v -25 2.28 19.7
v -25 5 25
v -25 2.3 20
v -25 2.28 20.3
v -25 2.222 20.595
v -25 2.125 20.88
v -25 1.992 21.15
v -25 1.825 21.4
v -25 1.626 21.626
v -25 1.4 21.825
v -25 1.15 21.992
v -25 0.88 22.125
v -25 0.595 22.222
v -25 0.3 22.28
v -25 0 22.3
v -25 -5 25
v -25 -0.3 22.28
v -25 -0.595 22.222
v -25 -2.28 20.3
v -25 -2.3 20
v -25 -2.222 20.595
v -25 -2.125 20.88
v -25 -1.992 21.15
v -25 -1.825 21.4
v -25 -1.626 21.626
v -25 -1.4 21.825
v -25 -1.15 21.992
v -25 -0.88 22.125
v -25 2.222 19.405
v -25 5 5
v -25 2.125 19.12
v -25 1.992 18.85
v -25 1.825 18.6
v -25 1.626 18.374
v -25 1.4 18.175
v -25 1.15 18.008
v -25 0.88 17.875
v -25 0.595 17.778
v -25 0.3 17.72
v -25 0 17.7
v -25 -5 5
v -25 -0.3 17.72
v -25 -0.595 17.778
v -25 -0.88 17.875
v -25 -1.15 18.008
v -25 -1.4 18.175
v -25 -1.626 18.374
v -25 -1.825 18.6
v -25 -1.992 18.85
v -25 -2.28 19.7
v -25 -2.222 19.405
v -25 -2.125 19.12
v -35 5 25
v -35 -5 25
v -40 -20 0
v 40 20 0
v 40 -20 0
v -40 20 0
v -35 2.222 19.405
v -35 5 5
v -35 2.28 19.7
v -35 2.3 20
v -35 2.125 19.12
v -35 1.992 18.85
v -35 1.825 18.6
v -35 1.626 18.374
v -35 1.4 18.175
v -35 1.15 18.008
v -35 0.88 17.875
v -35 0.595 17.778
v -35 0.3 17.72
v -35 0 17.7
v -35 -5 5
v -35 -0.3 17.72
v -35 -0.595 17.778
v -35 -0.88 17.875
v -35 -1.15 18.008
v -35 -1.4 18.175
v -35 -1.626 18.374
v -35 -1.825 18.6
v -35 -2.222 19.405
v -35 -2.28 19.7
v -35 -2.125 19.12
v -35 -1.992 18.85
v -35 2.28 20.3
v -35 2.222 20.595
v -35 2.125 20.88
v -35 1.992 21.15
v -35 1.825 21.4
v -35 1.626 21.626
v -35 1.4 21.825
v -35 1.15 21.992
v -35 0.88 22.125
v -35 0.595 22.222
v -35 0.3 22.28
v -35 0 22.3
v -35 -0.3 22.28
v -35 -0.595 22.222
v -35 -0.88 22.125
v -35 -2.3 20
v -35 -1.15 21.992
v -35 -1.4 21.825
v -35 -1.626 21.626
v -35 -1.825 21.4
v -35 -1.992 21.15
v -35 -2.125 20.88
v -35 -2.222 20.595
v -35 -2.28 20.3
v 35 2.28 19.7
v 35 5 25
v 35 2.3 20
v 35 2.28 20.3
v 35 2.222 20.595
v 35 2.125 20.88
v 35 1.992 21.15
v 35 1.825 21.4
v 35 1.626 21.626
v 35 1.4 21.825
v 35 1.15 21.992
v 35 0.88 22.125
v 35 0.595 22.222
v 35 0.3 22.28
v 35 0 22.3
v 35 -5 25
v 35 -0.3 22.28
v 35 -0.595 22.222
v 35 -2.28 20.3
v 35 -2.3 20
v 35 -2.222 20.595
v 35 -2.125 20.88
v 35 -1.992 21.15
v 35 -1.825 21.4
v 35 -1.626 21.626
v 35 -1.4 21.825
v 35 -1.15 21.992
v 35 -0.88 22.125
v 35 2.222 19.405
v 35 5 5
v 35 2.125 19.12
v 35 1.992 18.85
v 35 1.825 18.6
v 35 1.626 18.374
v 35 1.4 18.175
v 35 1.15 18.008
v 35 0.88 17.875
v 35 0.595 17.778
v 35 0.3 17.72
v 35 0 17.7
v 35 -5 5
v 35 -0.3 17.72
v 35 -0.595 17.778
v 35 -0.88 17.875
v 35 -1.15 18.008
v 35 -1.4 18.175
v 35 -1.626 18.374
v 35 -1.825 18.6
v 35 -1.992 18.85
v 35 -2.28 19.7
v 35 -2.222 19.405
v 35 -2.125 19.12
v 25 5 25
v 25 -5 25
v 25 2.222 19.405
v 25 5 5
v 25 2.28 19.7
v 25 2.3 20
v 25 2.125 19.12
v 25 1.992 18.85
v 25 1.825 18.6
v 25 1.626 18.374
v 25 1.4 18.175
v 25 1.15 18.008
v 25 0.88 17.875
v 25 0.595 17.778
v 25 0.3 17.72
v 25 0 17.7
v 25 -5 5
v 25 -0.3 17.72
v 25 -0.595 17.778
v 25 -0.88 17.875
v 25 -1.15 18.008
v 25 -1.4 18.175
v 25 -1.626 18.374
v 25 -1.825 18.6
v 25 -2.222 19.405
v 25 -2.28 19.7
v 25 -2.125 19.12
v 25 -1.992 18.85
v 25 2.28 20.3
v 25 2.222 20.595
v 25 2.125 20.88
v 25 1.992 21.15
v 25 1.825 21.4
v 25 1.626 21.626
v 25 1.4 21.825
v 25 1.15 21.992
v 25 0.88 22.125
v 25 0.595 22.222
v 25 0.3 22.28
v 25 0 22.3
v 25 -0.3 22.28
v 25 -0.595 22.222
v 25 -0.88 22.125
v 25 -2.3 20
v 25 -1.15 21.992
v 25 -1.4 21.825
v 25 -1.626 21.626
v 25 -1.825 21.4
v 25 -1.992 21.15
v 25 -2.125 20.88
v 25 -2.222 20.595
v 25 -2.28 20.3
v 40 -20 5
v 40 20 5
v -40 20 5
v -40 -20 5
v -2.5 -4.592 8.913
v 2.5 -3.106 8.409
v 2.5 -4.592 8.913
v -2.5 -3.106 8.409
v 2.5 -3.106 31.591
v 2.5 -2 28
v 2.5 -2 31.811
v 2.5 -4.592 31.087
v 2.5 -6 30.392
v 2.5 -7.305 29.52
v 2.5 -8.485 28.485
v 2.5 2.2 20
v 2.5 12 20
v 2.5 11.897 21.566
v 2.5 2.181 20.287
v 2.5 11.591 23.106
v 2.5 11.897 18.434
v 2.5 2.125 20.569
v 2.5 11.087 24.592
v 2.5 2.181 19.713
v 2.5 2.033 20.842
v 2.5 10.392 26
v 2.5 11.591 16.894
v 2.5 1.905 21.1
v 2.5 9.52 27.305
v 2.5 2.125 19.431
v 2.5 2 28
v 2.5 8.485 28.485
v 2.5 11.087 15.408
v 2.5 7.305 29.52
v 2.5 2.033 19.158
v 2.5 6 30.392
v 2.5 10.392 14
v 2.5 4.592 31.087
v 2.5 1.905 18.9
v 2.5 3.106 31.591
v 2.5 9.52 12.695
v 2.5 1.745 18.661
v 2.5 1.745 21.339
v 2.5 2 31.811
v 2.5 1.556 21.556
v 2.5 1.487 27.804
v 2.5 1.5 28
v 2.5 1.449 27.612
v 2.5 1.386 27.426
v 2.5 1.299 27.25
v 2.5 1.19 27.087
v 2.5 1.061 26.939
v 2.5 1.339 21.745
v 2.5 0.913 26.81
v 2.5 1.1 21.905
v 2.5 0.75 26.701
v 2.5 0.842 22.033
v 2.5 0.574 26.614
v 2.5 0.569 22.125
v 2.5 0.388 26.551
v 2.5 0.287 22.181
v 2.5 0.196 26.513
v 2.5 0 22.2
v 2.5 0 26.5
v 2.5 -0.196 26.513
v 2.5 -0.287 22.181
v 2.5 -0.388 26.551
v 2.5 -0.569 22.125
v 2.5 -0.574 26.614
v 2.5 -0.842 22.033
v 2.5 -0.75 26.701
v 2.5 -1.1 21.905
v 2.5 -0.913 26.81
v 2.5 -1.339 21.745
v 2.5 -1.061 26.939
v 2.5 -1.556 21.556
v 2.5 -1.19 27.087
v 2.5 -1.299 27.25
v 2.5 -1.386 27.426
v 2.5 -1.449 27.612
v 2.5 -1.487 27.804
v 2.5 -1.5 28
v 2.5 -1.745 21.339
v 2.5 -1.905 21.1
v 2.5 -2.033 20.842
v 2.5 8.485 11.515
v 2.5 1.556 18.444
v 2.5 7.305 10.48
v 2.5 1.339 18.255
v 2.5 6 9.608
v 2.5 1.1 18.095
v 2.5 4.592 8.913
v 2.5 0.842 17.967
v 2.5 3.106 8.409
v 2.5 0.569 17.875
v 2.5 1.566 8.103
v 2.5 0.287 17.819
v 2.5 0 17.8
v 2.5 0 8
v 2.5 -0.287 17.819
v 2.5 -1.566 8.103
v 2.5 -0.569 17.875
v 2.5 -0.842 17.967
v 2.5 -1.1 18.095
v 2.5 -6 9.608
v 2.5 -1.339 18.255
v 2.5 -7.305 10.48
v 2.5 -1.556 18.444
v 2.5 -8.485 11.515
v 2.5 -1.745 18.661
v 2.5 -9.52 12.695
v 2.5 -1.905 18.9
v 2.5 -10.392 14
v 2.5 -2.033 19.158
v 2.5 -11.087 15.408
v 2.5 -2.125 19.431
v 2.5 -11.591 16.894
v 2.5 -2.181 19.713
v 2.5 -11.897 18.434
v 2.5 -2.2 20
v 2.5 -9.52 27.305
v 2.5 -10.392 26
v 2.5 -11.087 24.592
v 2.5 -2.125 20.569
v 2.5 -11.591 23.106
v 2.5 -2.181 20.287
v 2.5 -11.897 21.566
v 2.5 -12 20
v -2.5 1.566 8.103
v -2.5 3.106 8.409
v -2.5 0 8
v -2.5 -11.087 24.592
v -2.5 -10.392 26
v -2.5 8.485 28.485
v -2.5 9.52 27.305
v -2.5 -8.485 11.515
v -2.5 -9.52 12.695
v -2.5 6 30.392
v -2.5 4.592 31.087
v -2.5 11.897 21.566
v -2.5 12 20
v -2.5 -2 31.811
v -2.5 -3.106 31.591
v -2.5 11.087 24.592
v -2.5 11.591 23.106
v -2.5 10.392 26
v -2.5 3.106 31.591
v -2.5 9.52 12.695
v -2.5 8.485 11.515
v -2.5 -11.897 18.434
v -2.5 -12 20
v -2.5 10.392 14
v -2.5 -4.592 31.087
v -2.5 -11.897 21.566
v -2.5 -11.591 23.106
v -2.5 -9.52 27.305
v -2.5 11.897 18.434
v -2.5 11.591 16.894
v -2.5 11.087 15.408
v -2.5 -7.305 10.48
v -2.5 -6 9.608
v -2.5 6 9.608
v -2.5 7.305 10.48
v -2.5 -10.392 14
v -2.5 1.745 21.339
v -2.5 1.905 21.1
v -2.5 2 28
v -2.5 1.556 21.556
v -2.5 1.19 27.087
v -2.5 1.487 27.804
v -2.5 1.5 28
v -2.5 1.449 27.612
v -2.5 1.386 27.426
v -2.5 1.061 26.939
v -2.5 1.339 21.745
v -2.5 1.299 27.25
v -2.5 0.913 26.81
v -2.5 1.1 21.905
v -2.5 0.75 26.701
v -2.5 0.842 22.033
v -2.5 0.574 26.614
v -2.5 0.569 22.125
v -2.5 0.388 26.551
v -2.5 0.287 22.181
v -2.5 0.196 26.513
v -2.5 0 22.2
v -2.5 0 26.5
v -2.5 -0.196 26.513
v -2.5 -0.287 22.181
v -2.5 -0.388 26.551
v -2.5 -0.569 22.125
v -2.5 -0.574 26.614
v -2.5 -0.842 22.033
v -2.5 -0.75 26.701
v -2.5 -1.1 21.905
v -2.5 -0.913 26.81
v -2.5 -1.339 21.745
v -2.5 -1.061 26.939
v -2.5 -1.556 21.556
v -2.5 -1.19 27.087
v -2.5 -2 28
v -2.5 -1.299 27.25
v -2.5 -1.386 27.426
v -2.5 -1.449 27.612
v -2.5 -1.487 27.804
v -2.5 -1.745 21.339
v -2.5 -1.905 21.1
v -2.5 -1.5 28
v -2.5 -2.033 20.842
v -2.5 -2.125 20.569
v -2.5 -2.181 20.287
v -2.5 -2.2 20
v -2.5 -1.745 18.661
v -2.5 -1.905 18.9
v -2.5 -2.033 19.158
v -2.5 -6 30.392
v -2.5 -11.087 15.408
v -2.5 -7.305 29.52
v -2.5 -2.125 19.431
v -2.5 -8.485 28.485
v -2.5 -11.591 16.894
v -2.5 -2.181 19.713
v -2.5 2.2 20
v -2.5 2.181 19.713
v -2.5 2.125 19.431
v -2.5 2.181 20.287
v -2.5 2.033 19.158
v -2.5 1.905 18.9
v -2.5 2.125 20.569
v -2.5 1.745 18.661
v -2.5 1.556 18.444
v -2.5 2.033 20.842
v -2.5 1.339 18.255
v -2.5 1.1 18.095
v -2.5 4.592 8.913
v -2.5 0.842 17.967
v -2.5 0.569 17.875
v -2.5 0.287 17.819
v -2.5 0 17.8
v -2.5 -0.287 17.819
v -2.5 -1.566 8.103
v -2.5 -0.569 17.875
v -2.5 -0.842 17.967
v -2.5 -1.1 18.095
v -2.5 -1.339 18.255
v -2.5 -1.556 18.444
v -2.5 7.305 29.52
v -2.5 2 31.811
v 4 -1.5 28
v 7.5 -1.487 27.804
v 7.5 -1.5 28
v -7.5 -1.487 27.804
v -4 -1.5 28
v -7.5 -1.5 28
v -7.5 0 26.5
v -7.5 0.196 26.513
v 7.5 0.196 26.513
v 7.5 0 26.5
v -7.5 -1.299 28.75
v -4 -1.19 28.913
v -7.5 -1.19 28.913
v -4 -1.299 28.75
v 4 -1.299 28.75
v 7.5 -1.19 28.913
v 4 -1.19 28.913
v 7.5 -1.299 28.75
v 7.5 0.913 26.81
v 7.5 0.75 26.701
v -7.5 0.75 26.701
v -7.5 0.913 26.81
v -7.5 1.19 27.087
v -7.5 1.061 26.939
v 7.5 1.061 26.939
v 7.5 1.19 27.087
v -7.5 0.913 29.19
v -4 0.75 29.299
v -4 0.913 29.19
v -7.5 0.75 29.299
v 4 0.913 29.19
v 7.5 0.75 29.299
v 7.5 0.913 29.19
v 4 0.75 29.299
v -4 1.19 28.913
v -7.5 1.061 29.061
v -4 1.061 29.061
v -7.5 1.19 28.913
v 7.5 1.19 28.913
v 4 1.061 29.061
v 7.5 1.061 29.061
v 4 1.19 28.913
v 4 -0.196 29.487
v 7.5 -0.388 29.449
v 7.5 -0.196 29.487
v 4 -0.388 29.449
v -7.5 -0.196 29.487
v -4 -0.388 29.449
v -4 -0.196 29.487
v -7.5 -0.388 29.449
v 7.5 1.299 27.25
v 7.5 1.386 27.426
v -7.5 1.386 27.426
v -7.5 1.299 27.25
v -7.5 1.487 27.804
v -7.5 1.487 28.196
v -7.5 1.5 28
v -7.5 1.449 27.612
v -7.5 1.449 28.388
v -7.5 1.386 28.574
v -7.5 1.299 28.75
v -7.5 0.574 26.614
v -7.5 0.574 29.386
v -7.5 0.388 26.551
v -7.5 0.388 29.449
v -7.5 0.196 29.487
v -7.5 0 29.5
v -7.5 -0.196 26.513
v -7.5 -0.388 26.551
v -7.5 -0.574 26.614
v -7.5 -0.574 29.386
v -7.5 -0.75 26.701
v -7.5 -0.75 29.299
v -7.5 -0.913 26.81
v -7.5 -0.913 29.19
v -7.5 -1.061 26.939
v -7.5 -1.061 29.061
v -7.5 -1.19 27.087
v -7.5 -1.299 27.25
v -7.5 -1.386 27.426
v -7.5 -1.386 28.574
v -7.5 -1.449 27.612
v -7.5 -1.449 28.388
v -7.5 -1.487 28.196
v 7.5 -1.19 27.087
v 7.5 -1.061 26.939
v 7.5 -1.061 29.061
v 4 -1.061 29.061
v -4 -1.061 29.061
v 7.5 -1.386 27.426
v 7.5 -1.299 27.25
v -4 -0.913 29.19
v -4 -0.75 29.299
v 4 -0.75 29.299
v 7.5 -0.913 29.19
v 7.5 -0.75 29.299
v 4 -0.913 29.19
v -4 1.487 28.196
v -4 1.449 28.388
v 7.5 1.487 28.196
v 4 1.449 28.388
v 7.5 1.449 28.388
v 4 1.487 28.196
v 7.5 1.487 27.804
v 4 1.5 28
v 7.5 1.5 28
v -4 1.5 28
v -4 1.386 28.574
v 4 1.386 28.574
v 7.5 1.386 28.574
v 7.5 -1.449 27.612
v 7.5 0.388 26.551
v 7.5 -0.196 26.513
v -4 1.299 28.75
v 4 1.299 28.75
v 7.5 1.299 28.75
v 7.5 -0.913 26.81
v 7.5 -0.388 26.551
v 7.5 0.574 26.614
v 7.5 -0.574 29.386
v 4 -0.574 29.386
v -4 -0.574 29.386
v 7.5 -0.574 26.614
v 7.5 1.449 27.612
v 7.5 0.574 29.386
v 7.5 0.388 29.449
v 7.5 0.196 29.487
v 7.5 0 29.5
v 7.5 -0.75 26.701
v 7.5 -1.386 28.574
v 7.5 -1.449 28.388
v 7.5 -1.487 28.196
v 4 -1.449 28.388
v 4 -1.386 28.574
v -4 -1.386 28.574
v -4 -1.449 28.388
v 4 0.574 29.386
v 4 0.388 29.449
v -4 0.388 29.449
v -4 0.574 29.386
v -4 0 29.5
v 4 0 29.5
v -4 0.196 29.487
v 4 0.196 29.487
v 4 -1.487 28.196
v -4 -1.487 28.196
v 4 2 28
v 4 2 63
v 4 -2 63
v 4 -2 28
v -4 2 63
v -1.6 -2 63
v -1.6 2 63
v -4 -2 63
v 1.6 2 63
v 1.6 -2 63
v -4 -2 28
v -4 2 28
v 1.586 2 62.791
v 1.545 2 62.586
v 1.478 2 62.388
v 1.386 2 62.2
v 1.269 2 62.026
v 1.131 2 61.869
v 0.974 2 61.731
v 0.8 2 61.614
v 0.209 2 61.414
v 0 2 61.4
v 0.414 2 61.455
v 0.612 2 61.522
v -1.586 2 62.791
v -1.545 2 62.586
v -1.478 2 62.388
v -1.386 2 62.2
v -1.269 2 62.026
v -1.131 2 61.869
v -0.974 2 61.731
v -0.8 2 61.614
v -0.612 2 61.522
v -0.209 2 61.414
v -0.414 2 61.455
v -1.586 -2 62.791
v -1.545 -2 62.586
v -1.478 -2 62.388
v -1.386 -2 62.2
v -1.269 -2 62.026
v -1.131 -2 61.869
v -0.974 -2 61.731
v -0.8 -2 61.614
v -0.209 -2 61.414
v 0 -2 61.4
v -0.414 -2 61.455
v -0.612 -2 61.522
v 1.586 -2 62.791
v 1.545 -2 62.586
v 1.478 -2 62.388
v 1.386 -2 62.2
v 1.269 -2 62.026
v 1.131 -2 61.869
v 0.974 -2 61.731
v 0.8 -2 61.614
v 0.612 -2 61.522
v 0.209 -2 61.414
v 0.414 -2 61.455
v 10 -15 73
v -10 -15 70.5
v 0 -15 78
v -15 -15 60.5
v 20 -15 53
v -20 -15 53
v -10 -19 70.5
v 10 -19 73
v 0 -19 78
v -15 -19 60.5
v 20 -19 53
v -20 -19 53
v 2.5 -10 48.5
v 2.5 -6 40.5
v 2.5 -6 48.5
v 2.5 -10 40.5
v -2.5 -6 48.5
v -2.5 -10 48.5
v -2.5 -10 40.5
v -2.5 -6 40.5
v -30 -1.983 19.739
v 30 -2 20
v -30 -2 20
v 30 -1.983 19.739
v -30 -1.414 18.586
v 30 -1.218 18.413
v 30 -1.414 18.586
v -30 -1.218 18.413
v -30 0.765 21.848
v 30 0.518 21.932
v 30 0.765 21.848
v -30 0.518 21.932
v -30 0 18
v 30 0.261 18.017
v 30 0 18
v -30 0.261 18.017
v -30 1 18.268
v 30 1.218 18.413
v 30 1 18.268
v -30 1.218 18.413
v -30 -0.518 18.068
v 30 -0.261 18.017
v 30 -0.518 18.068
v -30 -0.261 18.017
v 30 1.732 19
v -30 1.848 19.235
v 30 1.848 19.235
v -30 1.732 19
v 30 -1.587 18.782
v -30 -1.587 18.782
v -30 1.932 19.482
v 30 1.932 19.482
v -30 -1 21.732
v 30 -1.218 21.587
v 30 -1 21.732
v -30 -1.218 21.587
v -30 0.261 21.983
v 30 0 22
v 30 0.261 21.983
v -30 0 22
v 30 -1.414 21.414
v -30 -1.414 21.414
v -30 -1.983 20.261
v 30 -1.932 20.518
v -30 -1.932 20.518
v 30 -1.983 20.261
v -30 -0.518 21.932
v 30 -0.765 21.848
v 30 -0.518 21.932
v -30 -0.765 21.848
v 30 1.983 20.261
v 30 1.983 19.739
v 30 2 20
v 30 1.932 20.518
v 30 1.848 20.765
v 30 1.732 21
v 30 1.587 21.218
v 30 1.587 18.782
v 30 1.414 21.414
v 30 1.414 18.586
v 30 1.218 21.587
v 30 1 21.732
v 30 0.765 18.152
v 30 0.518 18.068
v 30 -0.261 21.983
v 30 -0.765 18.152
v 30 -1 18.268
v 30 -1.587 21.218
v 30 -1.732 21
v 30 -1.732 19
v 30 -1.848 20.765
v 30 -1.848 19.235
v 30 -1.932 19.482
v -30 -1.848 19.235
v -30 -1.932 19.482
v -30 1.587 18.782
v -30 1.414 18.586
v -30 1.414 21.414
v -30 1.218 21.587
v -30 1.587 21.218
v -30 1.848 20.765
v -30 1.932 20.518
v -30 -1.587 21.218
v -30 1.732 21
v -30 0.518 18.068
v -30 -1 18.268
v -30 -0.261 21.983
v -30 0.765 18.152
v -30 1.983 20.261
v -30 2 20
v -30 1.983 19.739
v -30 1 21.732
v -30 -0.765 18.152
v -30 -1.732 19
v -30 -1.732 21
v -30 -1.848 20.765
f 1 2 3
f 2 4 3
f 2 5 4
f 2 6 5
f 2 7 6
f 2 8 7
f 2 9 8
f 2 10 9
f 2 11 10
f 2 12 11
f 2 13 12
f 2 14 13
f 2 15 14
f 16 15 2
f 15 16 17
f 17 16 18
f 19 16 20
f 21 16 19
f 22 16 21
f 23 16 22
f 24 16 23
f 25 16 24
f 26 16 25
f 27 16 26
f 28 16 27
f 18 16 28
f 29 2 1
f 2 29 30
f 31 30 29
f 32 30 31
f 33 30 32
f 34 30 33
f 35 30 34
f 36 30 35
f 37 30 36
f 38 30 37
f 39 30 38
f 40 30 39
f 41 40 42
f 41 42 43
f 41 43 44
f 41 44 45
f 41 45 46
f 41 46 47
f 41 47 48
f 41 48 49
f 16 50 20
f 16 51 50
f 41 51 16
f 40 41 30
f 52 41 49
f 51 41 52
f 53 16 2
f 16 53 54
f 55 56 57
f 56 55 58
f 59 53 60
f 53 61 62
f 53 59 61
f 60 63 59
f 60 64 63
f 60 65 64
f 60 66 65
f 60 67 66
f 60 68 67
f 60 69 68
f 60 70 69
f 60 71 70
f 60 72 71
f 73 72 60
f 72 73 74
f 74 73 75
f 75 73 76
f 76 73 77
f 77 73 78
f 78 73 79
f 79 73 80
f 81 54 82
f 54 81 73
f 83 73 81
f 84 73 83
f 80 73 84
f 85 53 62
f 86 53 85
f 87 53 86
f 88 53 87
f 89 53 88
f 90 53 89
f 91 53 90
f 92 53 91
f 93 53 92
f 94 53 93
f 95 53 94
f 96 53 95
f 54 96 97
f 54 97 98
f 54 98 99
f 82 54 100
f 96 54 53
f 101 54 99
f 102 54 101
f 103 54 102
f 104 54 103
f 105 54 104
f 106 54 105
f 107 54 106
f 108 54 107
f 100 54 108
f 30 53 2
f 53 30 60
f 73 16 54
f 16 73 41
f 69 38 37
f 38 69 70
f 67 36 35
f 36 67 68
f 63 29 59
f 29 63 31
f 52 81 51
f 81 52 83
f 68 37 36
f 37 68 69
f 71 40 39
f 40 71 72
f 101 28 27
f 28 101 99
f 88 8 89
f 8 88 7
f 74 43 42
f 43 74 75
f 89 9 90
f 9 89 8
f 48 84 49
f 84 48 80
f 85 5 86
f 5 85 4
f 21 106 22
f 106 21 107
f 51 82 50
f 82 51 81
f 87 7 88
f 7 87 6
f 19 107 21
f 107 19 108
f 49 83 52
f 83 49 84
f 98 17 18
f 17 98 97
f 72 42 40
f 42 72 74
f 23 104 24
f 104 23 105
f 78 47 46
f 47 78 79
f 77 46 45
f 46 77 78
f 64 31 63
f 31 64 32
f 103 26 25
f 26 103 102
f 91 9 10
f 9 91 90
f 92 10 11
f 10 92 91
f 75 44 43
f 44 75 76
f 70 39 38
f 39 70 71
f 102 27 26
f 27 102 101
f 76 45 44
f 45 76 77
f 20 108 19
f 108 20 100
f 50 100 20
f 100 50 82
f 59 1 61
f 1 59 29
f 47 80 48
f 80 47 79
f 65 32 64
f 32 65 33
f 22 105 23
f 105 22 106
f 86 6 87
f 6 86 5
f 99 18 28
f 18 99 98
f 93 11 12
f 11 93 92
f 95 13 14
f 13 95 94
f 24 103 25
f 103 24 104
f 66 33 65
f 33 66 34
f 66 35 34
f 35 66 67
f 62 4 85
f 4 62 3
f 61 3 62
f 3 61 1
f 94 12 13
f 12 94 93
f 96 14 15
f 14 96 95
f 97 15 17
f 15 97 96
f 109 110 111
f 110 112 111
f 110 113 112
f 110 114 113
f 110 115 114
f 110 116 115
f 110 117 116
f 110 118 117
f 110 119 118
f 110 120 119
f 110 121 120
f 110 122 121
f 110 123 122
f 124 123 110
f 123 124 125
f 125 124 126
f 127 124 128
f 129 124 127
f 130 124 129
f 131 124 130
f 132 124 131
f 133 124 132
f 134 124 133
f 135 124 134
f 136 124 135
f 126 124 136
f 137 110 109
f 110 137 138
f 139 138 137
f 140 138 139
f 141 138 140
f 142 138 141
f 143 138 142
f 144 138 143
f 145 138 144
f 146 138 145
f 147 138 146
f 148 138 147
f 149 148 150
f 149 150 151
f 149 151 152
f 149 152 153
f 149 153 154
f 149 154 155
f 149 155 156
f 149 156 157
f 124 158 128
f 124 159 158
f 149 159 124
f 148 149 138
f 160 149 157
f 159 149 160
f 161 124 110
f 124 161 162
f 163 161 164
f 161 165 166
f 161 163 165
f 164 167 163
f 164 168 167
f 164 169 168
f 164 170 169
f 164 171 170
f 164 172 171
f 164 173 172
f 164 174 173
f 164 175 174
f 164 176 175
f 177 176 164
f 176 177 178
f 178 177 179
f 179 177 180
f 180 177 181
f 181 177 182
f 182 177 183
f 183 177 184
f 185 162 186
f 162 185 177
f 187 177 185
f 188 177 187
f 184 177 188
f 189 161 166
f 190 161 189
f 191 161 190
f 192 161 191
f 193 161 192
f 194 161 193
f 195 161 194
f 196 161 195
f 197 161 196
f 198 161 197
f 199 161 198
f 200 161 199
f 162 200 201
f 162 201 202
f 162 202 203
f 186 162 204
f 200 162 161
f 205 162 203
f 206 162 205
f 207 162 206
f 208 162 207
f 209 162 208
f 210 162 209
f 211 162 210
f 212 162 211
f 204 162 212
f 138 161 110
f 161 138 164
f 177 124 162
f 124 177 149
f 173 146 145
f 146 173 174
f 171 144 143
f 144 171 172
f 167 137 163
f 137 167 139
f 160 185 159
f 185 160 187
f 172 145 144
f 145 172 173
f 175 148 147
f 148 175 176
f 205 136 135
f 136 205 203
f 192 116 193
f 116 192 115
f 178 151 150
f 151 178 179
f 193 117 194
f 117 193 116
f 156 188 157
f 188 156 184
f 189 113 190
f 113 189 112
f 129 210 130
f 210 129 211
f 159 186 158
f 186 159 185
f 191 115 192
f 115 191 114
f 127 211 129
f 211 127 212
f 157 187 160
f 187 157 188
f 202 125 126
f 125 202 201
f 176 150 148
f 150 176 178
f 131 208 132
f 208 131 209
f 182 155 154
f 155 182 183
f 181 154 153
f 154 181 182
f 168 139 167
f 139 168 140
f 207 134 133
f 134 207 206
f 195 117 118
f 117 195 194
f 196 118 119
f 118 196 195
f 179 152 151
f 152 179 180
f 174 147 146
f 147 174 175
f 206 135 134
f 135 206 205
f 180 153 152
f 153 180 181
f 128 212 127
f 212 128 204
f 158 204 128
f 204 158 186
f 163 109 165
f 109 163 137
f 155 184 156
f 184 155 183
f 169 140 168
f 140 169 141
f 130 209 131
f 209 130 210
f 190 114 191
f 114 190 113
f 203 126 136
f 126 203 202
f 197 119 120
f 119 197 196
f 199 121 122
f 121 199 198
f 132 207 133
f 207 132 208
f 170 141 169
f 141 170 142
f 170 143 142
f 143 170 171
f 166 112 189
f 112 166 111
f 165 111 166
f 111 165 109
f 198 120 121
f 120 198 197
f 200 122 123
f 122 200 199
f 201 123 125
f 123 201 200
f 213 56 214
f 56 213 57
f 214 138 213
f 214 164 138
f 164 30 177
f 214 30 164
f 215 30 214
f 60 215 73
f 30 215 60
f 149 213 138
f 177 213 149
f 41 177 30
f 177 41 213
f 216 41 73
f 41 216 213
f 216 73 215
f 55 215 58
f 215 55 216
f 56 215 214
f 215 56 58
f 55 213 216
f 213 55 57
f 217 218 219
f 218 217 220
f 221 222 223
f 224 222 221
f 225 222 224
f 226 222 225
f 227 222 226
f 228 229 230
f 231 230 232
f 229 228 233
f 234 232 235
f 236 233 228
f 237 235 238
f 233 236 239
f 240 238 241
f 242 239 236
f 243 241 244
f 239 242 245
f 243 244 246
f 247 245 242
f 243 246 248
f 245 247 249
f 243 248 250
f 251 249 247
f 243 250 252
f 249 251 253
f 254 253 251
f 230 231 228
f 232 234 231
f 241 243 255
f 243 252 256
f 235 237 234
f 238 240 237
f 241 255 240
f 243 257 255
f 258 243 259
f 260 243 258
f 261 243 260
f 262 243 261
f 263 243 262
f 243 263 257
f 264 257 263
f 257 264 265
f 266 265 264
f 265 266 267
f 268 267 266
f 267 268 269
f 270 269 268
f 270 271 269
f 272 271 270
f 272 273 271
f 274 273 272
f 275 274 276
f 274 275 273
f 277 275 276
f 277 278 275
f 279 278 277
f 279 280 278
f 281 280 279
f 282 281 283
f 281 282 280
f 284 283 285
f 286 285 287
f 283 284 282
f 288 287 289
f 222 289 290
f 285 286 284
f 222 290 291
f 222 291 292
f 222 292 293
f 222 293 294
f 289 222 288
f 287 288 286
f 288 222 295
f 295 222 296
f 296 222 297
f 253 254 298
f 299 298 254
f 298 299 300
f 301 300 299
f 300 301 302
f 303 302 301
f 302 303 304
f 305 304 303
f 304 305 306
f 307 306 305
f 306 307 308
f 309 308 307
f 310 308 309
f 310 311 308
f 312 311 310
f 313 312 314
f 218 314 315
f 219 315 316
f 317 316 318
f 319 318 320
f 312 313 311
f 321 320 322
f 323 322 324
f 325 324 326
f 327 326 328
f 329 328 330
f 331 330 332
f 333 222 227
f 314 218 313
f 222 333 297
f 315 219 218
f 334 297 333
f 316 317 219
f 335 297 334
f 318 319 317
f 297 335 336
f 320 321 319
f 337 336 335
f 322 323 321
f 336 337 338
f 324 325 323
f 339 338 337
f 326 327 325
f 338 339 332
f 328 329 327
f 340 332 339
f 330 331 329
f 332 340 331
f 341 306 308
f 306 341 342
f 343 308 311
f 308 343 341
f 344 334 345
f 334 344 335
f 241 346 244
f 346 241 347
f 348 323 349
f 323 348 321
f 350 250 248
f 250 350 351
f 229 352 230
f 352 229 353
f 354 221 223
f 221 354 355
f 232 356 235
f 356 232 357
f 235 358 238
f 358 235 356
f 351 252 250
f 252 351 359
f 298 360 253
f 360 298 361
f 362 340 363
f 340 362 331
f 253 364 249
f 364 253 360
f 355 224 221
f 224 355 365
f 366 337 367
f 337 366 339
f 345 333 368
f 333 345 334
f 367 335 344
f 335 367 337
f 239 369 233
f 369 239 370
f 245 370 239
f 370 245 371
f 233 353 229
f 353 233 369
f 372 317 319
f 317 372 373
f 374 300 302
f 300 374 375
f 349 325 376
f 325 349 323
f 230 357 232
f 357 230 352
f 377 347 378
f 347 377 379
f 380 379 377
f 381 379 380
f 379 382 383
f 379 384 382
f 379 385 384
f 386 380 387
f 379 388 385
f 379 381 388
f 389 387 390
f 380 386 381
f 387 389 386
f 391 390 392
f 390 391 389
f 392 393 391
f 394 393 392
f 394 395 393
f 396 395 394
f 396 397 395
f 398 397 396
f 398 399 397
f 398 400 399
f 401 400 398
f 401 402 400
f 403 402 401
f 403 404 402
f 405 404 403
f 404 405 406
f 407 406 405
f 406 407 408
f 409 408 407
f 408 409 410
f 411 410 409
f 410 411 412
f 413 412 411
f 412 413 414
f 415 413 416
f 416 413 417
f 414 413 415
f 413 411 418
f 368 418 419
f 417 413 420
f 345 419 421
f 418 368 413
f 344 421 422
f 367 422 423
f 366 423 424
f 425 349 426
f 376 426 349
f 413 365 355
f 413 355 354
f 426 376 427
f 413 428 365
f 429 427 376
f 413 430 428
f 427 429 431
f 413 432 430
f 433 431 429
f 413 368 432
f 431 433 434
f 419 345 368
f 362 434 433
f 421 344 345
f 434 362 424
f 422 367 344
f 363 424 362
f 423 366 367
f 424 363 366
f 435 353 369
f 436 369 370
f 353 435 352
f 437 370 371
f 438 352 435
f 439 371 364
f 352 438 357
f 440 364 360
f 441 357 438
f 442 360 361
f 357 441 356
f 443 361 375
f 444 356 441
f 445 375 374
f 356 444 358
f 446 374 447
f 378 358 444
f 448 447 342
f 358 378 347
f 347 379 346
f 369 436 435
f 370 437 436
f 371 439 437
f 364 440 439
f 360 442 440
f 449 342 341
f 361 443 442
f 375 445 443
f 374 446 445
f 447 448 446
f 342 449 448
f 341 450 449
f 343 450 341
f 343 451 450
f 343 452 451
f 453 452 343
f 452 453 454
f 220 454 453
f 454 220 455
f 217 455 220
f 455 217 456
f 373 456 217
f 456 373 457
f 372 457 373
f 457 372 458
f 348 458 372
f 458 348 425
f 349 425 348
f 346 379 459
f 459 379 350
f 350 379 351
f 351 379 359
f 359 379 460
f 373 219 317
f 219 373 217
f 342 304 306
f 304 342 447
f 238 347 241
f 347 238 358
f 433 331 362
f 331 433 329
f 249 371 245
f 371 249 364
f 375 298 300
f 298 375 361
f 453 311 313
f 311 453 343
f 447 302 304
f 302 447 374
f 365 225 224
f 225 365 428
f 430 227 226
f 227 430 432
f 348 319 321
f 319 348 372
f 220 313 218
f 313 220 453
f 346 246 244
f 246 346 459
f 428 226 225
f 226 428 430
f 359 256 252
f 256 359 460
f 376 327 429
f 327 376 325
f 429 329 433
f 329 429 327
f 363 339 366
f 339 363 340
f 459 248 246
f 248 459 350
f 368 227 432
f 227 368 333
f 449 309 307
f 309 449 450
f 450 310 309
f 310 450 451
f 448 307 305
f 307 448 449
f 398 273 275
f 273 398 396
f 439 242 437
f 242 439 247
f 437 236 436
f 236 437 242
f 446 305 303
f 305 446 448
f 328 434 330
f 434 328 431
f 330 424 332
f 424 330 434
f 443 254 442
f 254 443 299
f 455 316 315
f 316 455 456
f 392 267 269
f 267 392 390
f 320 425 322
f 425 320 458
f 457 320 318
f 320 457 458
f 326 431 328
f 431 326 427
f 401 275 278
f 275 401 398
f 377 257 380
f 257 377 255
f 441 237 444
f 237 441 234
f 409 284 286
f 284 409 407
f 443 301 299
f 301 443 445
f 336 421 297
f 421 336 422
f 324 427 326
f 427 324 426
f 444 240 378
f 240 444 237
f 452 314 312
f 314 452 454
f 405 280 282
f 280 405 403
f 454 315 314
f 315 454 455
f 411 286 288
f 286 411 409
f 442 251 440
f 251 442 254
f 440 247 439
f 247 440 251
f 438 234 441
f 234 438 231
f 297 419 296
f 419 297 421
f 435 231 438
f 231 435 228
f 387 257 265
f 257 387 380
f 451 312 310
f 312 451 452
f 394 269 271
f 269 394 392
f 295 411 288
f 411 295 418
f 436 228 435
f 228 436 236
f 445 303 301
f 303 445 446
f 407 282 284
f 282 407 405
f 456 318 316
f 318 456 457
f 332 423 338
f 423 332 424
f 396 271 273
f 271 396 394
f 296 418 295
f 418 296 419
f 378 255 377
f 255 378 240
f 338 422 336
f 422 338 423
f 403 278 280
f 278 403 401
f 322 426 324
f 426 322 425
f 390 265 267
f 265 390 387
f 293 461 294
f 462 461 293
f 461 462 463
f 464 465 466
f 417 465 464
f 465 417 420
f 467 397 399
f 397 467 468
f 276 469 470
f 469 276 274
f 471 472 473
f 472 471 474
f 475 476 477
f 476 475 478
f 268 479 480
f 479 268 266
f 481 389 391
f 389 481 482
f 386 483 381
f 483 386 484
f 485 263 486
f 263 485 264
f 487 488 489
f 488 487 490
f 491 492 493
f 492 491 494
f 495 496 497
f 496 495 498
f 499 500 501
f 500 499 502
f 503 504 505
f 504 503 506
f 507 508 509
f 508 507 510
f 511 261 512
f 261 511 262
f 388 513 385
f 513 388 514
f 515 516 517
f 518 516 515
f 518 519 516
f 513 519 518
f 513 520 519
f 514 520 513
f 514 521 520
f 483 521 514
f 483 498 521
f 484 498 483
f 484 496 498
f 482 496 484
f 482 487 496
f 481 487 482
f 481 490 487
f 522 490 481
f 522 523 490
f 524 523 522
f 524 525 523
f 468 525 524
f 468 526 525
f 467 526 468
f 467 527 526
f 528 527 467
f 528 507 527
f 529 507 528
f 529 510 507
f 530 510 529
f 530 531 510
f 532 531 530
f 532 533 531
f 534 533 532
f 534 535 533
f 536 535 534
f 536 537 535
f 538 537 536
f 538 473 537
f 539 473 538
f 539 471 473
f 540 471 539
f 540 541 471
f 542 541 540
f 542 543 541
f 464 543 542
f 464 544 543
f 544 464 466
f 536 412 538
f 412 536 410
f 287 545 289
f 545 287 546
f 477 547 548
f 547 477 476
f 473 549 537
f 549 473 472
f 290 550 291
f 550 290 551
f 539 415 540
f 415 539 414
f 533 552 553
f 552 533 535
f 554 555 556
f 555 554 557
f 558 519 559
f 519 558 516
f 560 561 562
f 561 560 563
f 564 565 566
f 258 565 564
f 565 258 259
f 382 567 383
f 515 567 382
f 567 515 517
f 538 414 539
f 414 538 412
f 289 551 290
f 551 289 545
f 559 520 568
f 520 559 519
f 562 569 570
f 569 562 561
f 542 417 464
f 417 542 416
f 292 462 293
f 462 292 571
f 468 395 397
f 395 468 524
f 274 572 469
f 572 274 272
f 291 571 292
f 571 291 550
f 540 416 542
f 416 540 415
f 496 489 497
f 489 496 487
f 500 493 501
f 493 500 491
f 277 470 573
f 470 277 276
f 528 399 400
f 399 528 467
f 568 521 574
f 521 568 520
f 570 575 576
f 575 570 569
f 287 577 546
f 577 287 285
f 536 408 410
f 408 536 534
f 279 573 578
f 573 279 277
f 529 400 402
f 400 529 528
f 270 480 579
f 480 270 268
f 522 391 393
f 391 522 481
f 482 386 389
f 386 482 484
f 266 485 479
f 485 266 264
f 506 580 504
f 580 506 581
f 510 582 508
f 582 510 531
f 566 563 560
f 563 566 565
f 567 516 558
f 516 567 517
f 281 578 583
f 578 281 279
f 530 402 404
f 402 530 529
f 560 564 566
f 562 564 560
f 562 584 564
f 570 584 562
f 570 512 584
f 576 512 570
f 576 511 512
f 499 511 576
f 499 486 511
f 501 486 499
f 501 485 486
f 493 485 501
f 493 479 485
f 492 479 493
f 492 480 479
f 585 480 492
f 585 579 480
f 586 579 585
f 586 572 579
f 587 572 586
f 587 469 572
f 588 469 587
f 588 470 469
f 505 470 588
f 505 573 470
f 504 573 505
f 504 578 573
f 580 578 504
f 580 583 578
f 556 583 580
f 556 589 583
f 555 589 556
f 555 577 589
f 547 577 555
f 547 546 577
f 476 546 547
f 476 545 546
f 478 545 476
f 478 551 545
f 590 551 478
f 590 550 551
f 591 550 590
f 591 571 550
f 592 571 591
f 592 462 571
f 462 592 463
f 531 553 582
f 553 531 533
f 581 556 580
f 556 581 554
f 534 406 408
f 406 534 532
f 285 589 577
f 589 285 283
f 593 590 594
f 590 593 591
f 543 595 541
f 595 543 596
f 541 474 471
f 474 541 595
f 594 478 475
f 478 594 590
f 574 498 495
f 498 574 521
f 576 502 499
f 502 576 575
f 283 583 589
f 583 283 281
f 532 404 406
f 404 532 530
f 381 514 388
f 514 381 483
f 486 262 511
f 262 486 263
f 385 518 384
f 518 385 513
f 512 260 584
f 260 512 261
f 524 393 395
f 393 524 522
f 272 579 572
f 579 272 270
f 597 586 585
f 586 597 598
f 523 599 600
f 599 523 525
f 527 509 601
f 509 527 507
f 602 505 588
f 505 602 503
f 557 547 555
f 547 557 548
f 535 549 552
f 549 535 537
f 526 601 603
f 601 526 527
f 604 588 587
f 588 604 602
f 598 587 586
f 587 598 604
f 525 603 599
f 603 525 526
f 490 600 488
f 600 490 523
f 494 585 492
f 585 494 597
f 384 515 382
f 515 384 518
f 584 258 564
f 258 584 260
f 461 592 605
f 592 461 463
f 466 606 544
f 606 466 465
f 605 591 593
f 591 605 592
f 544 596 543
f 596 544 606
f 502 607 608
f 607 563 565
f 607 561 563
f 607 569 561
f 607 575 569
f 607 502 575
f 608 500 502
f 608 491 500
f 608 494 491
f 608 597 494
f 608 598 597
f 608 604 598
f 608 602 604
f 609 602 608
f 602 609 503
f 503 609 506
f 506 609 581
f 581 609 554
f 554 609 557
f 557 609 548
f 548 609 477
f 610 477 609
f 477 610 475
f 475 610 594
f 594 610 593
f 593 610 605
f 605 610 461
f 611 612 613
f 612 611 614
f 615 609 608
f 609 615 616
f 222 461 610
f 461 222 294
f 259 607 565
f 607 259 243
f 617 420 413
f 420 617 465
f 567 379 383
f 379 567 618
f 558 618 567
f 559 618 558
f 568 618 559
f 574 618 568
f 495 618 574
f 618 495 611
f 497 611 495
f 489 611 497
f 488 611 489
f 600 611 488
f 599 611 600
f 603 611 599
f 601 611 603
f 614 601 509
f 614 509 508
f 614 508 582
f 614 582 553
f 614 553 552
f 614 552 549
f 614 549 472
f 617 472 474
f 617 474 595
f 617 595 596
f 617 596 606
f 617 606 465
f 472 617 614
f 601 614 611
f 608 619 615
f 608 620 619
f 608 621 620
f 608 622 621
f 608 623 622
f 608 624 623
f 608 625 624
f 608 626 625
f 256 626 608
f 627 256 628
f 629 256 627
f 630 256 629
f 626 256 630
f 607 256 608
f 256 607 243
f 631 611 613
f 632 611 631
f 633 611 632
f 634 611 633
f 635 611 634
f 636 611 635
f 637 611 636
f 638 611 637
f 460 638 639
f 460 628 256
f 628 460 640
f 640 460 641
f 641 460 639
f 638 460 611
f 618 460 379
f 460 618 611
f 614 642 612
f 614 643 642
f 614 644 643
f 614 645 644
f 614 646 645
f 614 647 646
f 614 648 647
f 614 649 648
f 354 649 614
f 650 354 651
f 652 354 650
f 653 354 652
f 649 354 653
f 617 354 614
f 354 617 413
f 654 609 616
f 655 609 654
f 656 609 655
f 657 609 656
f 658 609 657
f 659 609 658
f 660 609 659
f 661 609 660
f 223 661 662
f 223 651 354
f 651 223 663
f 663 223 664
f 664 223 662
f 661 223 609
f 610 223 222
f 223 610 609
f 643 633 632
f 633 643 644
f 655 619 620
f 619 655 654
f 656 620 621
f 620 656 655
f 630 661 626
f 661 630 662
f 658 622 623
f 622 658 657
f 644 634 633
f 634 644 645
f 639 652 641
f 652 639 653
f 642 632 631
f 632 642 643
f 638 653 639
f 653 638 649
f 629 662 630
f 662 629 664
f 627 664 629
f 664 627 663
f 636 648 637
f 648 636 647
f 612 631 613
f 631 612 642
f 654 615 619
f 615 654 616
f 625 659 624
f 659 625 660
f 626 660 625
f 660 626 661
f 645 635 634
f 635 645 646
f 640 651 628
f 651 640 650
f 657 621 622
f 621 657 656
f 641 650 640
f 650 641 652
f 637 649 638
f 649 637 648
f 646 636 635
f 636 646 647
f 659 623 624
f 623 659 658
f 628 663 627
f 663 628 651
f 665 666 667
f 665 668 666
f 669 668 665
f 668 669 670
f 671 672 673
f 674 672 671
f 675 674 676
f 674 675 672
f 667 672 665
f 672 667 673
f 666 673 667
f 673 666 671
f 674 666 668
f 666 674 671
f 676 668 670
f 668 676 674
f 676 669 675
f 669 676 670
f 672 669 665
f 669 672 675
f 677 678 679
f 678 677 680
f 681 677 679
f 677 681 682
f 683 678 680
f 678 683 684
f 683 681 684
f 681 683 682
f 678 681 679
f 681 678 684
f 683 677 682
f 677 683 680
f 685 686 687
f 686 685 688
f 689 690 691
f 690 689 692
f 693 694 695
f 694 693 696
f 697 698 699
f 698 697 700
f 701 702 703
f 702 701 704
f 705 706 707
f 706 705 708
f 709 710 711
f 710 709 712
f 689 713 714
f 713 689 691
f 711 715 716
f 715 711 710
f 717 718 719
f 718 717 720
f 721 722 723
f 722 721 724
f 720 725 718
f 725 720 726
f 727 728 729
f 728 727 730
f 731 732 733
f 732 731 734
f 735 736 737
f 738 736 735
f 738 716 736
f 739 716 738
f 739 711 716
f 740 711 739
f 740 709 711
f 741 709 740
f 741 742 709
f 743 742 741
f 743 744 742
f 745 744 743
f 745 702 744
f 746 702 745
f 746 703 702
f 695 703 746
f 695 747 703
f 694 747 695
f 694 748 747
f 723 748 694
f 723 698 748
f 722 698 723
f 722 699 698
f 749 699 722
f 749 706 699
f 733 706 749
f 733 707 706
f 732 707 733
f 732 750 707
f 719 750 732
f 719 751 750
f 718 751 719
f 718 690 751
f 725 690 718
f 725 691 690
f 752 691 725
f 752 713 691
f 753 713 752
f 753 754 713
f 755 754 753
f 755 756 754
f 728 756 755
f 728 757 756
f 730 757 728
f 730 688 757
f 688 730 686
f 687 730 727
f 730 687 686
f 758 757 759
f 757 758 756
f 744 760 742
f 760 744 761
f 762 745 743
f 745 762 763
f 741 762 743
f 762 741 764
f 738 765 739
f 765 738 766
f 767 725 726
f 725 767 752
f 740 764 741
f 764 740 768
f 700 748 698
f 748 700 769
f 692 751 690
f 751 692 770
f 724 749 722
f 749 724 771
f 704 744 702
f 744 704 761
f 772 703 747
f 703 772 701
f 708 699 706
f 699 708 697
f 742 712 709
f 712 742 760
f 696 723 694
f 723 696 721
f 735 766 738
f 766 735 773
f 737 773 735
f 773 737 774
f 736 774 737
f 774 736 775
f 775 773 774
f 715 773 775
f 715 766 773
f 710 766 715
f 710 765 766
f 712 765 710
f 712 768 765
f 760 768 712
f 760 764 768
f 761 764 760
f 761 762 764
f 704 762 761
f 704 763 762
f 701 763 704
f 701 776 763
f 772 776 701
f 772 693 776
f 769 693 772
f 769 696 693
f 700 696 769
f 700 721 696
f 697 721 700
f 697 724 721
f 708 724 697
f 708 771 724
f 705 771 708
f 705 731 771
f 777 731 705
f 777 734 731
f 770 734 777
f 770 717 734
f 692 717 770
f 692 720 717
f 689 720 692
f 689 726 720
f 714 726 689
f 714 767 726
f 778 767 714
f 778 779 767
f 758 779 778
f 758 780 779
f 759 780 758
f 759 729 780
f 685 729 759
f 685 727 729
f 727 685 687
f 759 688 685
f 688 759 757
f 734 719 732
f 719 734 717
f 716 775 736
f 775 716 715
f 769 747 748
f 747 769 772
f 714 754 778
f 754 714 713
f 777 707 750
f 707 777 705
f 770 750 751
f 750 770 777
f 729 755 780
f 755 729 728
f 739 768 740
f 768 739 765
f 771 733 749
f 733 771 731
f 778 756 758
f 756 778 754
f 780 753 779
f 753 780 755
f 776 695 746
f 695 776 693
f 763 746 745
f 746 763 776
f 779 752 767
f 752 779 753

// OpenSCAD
/*
 * WAVE OCEAN V10 - APPROACH A: ECCENTRIC CRANK
 * Single wave test - validates mechanism geometry
 *
 * VIEWER POV: Front view, looking at -Y axis
 *   X = horizontal (left/right)
 *   Z = vertical (up/down)
 *   Y = depth (into screen)
 *
 * MECHANISM: Eccentric crank drives wave in elliptical path
 *   - Rotating disc with offset pin
 *   - Crank arm connects pin to wave element
 *   - Guide rails constrain wave to vertical + slight horizontal
 *
 * Expected motion: Wave rises while drifting RIGHT, falls while drifting LEFT
 */

$fn = 48;

// ============================================
// ANIMATION
// ============================================

MANUAL_ANGLE = -1;  // Set 0-360 for static, -1 for animation
theta = (MANUAL_ANGLE >= 0) ? MANUAL_ANGLE : $t * 360;

// ============================================
// PHYSICAL DIMENSIONS (mm)
// ============================================

// Drive shaft (horizontal, runs along X axis)
SHAFT_DIA = 4;
SHAFT_LENGTH = 60;
SHAFT_Y = 0;        // Center of mechanism (depth)
SHAFT_Z = 20;       // Height of shaft axis

// Eccentric disc (mounted on shaft)
DISC_OUTER_DIA = 24;
DISC_THICKNESS = 5;
ECCENTRIC_RADIUS = 8;  // Distance from shaft center to pin center
                       // This sets amplitude: wave moves +/- 8mm vertically

// Crank pin (on disc, offset from center)
PIN_DIA = 3;
PIN_LENGTH = 15;       // Must be long enough to reach crank arm

// Crank arm (connects pin to wave)
CRANK_LENGTH = 35;     // Distance from pin axis to wave pivot
CRANK_WIDTH = 8;
CRANK_THICKNESS = 4;
CRANK_HOLE_DIA = 3.2;  // Clearance for pin

// Wave element (the visible moving part)
WAVE_WIDTH = 40;       // X dimension (visible width)
WAVE_HEIGHT = 25;      // Z dimension (visible height)
WAVE_DEPTH = 4;        // Y dimension (thickness)

// Guide rail (constrains wave motion)
GUIDE_HEIGHT = 60;     // Total height of guide
GUIDE_SLOT_WIDTH = 6;  // Horizontal slot allows slight X drift
GUIDE_SLOT_HEIGHT = 40;// Vertical travel range
GUIDE_THICKNESS = 5;

// Wave pivot tab (rides in guide slot)
TAB_WIDTH = 5;
TAB_HEIGHT = 8;
TAB_DEPTH = WAVE_DEPTH;

// Frame reference
FRAME_WIDTH = 80;
FRAME_DEPTH = 40;
FRAME_HEIGHT = 5;

// ============================================
// COLORS
// ============================================

C_SHAFT = [0.6, 0.6, 0.65];
C_DISC = [0.8, 0.5, 0.2];      // Bronze
C_PIN = [0.5, 0.5, 0.55];
C_CRANK = [0.7, 0.7, 0.75];
C_WAVE = [0.25, 0.45, 0.75];   // Ocean blue
C_GUIDE = [0.35, 0.35, 0.4];
C_FRAME = [0.3, 0.3, 0.35];

// ============================================
// KINEMATICS
// ============================================

// Pin position (traces circle as disc rotates)
function pin_x() = 0;  // Pin stays at disc X position
function pin_y() = SHAFT_Y + ECCENTRIC_RADIUS * sin(theta);
function pin_z() = SHAFT_Z + ECCENTRIC_RADIUS * cos(theta);

// Wave center position (connected to pin via crank arm)
// Crank arm is rigid, length CRANK_LENGTH
// Wave is constrained to move mostly vertically by guide rail
// Simplified: wave Z follows pin Z, wave X drifts based on pin Y
function wave_z() = pin_z() + (CRANK_LENGTH - 10);  // Offset above pin
function wave_x_drift() = pin_y() * 0.3;  // Partial horizontal coupling

// Crank arm angle (geometry)
function crank_angle() = atan2(pin_y(), pin_z() - SHAFT_Z);

// ============================================
// MODULES: MECHANISM PARTS
// ============================================

// Drive shaft (rotates around X axis)
module drive_shaft() {
    color(C_SHAFT)
    translate([-SHAFT_LENGTH/2, SHAFT_Y, SHAFT_Z])
    rotate([0, 90, 0])
        cylinder(d=SHAFT_DIA, h=SHAFT_LENGTH);
}

// Eccentric disc with pin (mounted on shaft, rotates with it)
module eccentric_disc() {
    disc_x = 0;

    color(C_DISC)
    translate([disc_x, SHAFT_Y, SHAFT_Z])
    rotate([0, 90, 0])  // Disc face perpendicular to X axis
    rotate([0, 0, theta])  // Rotate with animation
    difference() {
        // Disc body
        cylinder(d=DISC_OUTER_DIA, h=DISC_THICKNESS, center=true);
        // Shaft hole (center)
        cylinder(d=SHAFT_DIA + 0.4, h=DISC_THICKNESS + 2, center=true);
    }

    // Crank pin (offset from center by ECCENTRIC_RADIUS)
    color(C_PIN)
    translate([disc_x, pin_y(), pin_z()])
    rotate([0, 90, 0])
        cylinder(d=PIN_DIA, h=PIN_LENGTH, center=true);
}

// Crank arm (connects pin to wave)
module crank_arm() {
    arm_x = 0;

    color(C_CRANK)
    translate([arm_x, pin_y(), pin_z()])
    rotate([crank_angle(), 0, 0])  // Rotate to follow pin
    translate([0, 0, CRANK_LENGTH/2])
    difference() {
        // Arm body
        cube([CRANK_WIDTH, CRANK_THICKNESS, CRANK_LENGTH], center=true);
        // Pin hole at bottom
        translate([0, 0, -CRANK_LENGTH/2])
        rotate([90, 0, 0])
            cylinder(d=CRANK_HOLE_DIA, h=CRANK_THICKNESS + 2, center=true);
        // Pivot hole at top
        translate([0, 0, CRANK_LENGTH/2])
        rotate([90, 0, 0])
            cylinder(d=CRANK_HOLE_DIA, h=CRANK_THICKNESS + 2, center=true);
    }
}

// Wave element (the visible ocean wave shape)
module wave_element() {
    wz = wave_z();
    wx_drift = wave_x_drift();

    color(C_WAVE)
    translate([wx_drift, -15, wz])  // Positioned in front (toward viewer)
    rotate([90, 0, 0])
    linear_extrude(height=WAVE_DEPTH)
    // Wave profile (simple curved shape)
    polygon([
        [-WAVE_WIDTH/2, 0],
        [-WAVE_WIDTH/2 + 5, WAVE_HEIGHT * 0.3],
        [-WAVE_WIDTH/4, WAVE_HEIGHT * 0.7],
        [0, WAVE_HEIGHT],                        // Peak
        [WAVE_WIDTH/4, WAVE_HEIGHT * 0.8],
        [WAVE_WIDTH/2 - 5, WAVE_HEIGHT * 0.4],
        [WAVE_WIDTH/2, 0]
    ]);

    // Pivot tab (connects to crank, rides in guide)
    color(C_WAVE)
    translate([wx_drift - TAB_WIDTH/2, -10, wz - WAVE_HEIGHT/2])
        cube([TAB_WIDTH, TAB_DEPTH, TAB_HEIGHT]);
}

// Guide rail (constrains wave to vertical path with slight horizontal play)
module guide_rail() {
    guide_x = -WAVE_WIDTH/2 - 10;
    guide_y = -10;
    guide_z = SHAFT_Z;

    color(C_GUIDE)
    translate([guide_x, guide_y, guide_z])
    difference() {
        // Rail body
        cube([GUIDE_THICKNESS, GUIDE_THICKNESS, GUIDE_HEIGHT]);
        // Slot for wave tab
        translate([-1, -1, GUIDE_HEIGHT/2 - GUIDE_SLOT_HEIGHT/2])
            cube([GUIDE_THICKNESS + 2, GUIDE_THICKNESS + 2, GUIDE_SLOT_HEIGHT]);
    }

    // Second guide rail (right side)
    color(C_GUIDE)
    translate([WAVE_WIDTH/2 + 5, guide_y, guide_z])
    difference() {
        cube([GUIDE_THICKNESS, GUIDE_THICKNESS, GUIDE_HEIGHT]);
        translate([-1, -1, GUIDE_HEIGHT/2 - GUIDE_SLOT_HEIGHT/2])
            cube([GUIDE_THICKNESS + 2, GUIDE_THICKNESS + 2, GUIDE_SLOT_HEIGHT]);
    }
}

// Base frame (static reference)
module base_frame() {
    color(C_FRAME)
    translate([-FRAME_WIDTH/2, -FRAME_DEPTH/2, 0])
        cube([FRAME_WIDTH, FRAME_DEPTH, FRAME_HEIGHT]);

    // Shaft supports
    color(C_FRAME) {
        translate([-SHAFT_LENGTH/2 - 5, SHAFT_Y - 5, 0])
        difference() {
            cube([10, 10, SHAFT_Z + 5]);
            translate([5, 5, SHAFT_Z])
            rotate([0, 90, 0])
                cylinder(d=SHAFT_DIA + 0.6, h=12, center=true);
        }

        translate([SHAFT_LENGTH/2 - 5, SHAFT_Y - 5, 0])
        difference() {
            cube([10, 10, SHAFT_Z + 5]);
            translate([5, 5, SHAFT_Z])
            rotate([0, 90, 0])
                cylinder(d=SHAFT_DIA + 0.6, h=12, center=true);
        }
    }
}

// ============================================
// MAIN ASSEMBLY
// ============================================

module wave_ocean_v10_crankA() {
    base_frame();
    drive_shaft();
    eccentric_disc();
    crank_arm();
    wave_element();
    // guide_rail();  // Uncomment to see guides
}

// Render
wave_ocean_v10_crankA();

// ============================================
// DEBUG OUTPUT
// ============================================

echo("=== WAVE OCEAN V10 - APPROACH A: ECCENTRIC CRANK ===");
echo(str("theta = ", theta, " degrees"));
echo(str("Pin position: Y=", pin_y(), " Z=", pin_z()));
echo(str("Wave Z = ", wave_z(), ", X drift = ", wave_x_drift()));
echo("");
echo("Mechanism check:");
echo(str("  Eccentric radius: ", ECCENTRIC_RADIUS, "mm (vertical amplitude)"));
echo(str("  Crank arm length: ", CRANK_LENGTH, "mm (CONSTANT - must not change during rotation)"));
echo(str("  Shaft through disc: ", SHAFT_DIA, "mm shaft, ", SHAFT_DIA + 0.4, "mm hole = ", 0.4, "mm clearance"));
echo("");
echo("Animation: View -> Animate, FPS=30, Steps=60");
echo("Watch from FRONT (looking at -Y) to see wave motion");

// ============================================
// VERIFICATION: CRANK LENGTH CONSTANT
// ============================================

// At theta=0: pin at (0, 0, 28), wave at ~(0, -15, 53)
// At theta=90: pin at (0, 8, 20), wave at ~(2.4, -15, 45)
// At theta=180: pin at (0, 0, 12), wave at ~(0, -15, 37)
// At theta=270: pin at (0, -8, 20), wave at ~(-2.4, -15, 45)
//
// Crank length = sqrt((wave_y - pin_y)^2 + (wave_z - pin_z)^2)
// Should be ~35mm at all angles (CRANK_LENGTH = 35)

verify_crank = sqrt(pow(-15 - pin_y(), 2) + pow(wave_z() - pin_z(), 2));
echo(str("Crank length at current theta: ", verify_crank, "mm (should be ~35mm)"));
